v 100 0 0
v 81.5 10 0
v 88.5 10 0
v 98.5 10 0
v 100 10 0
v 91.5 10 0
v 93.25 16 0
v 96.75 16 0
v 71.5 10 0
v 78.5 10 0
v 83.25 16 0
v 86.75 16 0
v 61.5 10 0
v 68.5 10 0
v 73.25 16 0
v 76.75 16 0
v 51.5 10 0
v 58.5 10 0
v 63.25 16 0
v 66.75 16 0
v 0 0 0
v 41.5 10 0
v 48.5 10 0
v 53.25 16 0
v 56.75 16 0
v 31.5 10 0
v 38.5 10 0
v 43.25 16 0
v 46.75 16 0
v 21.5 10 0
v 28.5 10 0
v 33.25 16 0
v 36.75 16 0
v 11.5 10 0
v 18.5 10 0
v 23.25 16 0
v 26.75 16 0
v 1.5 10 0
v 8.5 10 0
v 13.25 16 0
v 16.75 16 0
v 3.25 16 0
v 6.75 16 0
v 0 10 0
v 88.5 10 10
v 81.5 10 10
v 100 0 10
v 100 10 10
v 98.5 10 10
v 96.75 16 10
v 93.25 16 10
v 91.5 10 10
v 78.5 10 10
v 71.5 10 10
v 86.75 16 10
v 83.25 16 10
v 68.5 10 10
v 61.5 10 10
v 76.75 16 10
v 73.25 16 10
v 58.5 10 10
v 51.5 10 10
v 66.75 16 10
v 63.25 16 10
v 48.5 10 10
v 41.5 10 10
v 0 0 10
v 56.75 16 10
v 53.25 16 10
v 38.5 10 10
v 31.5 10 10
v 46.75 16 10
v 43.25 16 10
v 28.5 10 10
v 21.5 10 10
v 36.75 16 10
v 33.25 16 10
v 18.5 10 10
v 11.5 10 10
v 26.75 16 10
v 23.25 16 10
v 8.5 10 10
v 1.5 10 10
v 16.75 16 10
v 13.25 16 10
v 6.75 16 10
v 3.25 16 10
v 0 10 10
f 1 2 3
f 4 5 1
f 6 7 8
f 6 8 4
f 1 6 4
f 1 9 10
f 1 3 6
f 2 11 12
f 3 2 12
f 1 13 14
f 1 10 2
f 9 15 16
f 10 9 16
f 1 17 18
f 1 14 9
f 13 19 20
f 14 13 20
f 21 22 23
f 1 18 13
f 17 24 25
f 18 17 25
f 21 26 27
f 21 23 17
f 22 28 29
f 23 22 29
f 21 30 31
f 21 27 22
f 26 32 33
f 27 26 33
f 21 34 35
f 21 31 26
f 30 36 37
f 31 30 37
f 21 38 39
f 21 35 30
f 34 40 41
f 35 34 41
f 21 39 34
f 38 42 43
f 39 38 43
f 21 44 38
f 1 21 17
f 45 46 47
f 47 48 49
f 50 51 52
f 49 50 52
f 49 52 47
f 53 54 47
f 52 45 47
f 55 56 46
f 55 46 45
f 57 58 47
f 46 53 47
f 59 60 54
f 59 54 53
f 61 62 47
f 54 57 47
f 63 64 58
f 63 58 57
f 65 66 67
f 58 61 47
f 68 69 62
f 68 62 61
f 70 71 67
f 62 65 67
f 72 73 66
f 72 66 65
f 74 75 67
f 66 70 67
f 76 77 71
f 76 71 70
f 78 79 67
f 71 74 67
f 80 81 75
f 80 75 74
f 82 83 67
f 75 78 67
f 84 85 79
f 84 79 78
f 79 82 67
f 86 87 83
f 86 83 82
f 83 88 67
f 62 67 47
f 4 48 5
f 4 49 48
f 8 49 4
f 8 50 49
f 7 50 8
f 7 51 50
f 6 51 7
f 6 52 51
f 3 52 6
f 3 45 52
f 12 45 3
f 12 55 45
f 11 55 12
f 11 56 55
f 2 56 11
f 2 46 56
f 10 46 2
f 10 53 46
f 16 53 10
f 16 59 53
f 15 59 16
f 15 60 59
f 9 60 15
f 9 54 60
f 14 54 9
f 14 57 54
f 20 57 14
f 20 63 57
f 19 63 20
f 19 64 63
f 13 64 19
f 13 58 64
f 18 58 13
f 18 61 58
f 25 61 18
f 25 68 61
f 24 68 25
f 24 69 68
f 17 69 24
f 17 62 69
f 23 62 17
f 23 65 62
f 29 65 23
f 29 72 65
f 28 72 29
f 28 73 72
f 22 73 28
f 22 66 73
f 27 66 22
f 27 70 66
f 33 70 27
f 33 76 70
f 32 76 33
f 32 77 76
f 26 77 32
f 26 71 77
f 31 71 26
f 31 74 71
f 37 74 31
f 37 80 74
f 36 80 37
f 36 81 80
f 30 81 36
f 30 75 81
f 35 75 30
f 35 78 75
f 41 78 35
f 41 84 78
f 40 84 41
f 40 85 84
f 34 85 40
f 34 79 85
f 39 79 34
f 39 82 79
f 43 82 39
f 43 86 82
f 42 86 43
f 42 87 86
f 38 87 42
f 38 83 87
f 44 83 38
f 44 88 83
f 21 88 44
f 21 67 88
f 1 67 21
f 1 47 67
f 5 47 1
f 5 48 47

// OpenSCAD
$fn = 32;

// ----------------------------------------------------------------------
// Gear rack: 10 teeth, pitch 10 mm
// ----------------------------------------------------------------------

// --- parameters (mm) ---
teeth = 10;               // number of teeth
pitch = 10;               // tooth pitch, X
root_w = 7;               // tooth width at the root
tip_w = 3.5;              // tooth width at the tip
base_h = 10;              // rack body height, Y
tooth_h = 6;              // tooth height above the body
plate_t = 10;             // rack width, Z (extrusion height)

rack_l = teeth * pitch;  // overall length
total_h = base_h + tooth_h;  // overall height

profile = [[0, 0], [100, 0], [100, 10], [98.5, 10], [96.75, 16], [93.25, 16], [91.5, 10], [88.5, 10], [86.75, 16], [83.25, 16], [81.5, 10], [78.5, 10], [76.75, 16], [73.25, 16], [71.5, 10], [68.5, 10], [66.75, 16], [63.25, 16], [61.5, 10], [58.5, 10], [56.75, 16], [53.25, 16], [51.5, 10], [48.5, 10], [46.75, 16], [43.25, 16], [41.5, 10], [38.5, 10], [36.75, 16], [33.25, 16], [31.5, 10], [28.5, 10], [26.75, 16], [23.25, 16], [21.5, 10], [18.5, 10], [16.75, 16], [13.25, 16], [11.5, 10], [8.5, 10], [6.75, 16], [3.25, 16], [1.5, 10], [0, 10]];  // primary outline, 44 points, counter clockwise

// --- the one profile operation ---
linear_extrude(height = plate_t) polygon(points = profile);
